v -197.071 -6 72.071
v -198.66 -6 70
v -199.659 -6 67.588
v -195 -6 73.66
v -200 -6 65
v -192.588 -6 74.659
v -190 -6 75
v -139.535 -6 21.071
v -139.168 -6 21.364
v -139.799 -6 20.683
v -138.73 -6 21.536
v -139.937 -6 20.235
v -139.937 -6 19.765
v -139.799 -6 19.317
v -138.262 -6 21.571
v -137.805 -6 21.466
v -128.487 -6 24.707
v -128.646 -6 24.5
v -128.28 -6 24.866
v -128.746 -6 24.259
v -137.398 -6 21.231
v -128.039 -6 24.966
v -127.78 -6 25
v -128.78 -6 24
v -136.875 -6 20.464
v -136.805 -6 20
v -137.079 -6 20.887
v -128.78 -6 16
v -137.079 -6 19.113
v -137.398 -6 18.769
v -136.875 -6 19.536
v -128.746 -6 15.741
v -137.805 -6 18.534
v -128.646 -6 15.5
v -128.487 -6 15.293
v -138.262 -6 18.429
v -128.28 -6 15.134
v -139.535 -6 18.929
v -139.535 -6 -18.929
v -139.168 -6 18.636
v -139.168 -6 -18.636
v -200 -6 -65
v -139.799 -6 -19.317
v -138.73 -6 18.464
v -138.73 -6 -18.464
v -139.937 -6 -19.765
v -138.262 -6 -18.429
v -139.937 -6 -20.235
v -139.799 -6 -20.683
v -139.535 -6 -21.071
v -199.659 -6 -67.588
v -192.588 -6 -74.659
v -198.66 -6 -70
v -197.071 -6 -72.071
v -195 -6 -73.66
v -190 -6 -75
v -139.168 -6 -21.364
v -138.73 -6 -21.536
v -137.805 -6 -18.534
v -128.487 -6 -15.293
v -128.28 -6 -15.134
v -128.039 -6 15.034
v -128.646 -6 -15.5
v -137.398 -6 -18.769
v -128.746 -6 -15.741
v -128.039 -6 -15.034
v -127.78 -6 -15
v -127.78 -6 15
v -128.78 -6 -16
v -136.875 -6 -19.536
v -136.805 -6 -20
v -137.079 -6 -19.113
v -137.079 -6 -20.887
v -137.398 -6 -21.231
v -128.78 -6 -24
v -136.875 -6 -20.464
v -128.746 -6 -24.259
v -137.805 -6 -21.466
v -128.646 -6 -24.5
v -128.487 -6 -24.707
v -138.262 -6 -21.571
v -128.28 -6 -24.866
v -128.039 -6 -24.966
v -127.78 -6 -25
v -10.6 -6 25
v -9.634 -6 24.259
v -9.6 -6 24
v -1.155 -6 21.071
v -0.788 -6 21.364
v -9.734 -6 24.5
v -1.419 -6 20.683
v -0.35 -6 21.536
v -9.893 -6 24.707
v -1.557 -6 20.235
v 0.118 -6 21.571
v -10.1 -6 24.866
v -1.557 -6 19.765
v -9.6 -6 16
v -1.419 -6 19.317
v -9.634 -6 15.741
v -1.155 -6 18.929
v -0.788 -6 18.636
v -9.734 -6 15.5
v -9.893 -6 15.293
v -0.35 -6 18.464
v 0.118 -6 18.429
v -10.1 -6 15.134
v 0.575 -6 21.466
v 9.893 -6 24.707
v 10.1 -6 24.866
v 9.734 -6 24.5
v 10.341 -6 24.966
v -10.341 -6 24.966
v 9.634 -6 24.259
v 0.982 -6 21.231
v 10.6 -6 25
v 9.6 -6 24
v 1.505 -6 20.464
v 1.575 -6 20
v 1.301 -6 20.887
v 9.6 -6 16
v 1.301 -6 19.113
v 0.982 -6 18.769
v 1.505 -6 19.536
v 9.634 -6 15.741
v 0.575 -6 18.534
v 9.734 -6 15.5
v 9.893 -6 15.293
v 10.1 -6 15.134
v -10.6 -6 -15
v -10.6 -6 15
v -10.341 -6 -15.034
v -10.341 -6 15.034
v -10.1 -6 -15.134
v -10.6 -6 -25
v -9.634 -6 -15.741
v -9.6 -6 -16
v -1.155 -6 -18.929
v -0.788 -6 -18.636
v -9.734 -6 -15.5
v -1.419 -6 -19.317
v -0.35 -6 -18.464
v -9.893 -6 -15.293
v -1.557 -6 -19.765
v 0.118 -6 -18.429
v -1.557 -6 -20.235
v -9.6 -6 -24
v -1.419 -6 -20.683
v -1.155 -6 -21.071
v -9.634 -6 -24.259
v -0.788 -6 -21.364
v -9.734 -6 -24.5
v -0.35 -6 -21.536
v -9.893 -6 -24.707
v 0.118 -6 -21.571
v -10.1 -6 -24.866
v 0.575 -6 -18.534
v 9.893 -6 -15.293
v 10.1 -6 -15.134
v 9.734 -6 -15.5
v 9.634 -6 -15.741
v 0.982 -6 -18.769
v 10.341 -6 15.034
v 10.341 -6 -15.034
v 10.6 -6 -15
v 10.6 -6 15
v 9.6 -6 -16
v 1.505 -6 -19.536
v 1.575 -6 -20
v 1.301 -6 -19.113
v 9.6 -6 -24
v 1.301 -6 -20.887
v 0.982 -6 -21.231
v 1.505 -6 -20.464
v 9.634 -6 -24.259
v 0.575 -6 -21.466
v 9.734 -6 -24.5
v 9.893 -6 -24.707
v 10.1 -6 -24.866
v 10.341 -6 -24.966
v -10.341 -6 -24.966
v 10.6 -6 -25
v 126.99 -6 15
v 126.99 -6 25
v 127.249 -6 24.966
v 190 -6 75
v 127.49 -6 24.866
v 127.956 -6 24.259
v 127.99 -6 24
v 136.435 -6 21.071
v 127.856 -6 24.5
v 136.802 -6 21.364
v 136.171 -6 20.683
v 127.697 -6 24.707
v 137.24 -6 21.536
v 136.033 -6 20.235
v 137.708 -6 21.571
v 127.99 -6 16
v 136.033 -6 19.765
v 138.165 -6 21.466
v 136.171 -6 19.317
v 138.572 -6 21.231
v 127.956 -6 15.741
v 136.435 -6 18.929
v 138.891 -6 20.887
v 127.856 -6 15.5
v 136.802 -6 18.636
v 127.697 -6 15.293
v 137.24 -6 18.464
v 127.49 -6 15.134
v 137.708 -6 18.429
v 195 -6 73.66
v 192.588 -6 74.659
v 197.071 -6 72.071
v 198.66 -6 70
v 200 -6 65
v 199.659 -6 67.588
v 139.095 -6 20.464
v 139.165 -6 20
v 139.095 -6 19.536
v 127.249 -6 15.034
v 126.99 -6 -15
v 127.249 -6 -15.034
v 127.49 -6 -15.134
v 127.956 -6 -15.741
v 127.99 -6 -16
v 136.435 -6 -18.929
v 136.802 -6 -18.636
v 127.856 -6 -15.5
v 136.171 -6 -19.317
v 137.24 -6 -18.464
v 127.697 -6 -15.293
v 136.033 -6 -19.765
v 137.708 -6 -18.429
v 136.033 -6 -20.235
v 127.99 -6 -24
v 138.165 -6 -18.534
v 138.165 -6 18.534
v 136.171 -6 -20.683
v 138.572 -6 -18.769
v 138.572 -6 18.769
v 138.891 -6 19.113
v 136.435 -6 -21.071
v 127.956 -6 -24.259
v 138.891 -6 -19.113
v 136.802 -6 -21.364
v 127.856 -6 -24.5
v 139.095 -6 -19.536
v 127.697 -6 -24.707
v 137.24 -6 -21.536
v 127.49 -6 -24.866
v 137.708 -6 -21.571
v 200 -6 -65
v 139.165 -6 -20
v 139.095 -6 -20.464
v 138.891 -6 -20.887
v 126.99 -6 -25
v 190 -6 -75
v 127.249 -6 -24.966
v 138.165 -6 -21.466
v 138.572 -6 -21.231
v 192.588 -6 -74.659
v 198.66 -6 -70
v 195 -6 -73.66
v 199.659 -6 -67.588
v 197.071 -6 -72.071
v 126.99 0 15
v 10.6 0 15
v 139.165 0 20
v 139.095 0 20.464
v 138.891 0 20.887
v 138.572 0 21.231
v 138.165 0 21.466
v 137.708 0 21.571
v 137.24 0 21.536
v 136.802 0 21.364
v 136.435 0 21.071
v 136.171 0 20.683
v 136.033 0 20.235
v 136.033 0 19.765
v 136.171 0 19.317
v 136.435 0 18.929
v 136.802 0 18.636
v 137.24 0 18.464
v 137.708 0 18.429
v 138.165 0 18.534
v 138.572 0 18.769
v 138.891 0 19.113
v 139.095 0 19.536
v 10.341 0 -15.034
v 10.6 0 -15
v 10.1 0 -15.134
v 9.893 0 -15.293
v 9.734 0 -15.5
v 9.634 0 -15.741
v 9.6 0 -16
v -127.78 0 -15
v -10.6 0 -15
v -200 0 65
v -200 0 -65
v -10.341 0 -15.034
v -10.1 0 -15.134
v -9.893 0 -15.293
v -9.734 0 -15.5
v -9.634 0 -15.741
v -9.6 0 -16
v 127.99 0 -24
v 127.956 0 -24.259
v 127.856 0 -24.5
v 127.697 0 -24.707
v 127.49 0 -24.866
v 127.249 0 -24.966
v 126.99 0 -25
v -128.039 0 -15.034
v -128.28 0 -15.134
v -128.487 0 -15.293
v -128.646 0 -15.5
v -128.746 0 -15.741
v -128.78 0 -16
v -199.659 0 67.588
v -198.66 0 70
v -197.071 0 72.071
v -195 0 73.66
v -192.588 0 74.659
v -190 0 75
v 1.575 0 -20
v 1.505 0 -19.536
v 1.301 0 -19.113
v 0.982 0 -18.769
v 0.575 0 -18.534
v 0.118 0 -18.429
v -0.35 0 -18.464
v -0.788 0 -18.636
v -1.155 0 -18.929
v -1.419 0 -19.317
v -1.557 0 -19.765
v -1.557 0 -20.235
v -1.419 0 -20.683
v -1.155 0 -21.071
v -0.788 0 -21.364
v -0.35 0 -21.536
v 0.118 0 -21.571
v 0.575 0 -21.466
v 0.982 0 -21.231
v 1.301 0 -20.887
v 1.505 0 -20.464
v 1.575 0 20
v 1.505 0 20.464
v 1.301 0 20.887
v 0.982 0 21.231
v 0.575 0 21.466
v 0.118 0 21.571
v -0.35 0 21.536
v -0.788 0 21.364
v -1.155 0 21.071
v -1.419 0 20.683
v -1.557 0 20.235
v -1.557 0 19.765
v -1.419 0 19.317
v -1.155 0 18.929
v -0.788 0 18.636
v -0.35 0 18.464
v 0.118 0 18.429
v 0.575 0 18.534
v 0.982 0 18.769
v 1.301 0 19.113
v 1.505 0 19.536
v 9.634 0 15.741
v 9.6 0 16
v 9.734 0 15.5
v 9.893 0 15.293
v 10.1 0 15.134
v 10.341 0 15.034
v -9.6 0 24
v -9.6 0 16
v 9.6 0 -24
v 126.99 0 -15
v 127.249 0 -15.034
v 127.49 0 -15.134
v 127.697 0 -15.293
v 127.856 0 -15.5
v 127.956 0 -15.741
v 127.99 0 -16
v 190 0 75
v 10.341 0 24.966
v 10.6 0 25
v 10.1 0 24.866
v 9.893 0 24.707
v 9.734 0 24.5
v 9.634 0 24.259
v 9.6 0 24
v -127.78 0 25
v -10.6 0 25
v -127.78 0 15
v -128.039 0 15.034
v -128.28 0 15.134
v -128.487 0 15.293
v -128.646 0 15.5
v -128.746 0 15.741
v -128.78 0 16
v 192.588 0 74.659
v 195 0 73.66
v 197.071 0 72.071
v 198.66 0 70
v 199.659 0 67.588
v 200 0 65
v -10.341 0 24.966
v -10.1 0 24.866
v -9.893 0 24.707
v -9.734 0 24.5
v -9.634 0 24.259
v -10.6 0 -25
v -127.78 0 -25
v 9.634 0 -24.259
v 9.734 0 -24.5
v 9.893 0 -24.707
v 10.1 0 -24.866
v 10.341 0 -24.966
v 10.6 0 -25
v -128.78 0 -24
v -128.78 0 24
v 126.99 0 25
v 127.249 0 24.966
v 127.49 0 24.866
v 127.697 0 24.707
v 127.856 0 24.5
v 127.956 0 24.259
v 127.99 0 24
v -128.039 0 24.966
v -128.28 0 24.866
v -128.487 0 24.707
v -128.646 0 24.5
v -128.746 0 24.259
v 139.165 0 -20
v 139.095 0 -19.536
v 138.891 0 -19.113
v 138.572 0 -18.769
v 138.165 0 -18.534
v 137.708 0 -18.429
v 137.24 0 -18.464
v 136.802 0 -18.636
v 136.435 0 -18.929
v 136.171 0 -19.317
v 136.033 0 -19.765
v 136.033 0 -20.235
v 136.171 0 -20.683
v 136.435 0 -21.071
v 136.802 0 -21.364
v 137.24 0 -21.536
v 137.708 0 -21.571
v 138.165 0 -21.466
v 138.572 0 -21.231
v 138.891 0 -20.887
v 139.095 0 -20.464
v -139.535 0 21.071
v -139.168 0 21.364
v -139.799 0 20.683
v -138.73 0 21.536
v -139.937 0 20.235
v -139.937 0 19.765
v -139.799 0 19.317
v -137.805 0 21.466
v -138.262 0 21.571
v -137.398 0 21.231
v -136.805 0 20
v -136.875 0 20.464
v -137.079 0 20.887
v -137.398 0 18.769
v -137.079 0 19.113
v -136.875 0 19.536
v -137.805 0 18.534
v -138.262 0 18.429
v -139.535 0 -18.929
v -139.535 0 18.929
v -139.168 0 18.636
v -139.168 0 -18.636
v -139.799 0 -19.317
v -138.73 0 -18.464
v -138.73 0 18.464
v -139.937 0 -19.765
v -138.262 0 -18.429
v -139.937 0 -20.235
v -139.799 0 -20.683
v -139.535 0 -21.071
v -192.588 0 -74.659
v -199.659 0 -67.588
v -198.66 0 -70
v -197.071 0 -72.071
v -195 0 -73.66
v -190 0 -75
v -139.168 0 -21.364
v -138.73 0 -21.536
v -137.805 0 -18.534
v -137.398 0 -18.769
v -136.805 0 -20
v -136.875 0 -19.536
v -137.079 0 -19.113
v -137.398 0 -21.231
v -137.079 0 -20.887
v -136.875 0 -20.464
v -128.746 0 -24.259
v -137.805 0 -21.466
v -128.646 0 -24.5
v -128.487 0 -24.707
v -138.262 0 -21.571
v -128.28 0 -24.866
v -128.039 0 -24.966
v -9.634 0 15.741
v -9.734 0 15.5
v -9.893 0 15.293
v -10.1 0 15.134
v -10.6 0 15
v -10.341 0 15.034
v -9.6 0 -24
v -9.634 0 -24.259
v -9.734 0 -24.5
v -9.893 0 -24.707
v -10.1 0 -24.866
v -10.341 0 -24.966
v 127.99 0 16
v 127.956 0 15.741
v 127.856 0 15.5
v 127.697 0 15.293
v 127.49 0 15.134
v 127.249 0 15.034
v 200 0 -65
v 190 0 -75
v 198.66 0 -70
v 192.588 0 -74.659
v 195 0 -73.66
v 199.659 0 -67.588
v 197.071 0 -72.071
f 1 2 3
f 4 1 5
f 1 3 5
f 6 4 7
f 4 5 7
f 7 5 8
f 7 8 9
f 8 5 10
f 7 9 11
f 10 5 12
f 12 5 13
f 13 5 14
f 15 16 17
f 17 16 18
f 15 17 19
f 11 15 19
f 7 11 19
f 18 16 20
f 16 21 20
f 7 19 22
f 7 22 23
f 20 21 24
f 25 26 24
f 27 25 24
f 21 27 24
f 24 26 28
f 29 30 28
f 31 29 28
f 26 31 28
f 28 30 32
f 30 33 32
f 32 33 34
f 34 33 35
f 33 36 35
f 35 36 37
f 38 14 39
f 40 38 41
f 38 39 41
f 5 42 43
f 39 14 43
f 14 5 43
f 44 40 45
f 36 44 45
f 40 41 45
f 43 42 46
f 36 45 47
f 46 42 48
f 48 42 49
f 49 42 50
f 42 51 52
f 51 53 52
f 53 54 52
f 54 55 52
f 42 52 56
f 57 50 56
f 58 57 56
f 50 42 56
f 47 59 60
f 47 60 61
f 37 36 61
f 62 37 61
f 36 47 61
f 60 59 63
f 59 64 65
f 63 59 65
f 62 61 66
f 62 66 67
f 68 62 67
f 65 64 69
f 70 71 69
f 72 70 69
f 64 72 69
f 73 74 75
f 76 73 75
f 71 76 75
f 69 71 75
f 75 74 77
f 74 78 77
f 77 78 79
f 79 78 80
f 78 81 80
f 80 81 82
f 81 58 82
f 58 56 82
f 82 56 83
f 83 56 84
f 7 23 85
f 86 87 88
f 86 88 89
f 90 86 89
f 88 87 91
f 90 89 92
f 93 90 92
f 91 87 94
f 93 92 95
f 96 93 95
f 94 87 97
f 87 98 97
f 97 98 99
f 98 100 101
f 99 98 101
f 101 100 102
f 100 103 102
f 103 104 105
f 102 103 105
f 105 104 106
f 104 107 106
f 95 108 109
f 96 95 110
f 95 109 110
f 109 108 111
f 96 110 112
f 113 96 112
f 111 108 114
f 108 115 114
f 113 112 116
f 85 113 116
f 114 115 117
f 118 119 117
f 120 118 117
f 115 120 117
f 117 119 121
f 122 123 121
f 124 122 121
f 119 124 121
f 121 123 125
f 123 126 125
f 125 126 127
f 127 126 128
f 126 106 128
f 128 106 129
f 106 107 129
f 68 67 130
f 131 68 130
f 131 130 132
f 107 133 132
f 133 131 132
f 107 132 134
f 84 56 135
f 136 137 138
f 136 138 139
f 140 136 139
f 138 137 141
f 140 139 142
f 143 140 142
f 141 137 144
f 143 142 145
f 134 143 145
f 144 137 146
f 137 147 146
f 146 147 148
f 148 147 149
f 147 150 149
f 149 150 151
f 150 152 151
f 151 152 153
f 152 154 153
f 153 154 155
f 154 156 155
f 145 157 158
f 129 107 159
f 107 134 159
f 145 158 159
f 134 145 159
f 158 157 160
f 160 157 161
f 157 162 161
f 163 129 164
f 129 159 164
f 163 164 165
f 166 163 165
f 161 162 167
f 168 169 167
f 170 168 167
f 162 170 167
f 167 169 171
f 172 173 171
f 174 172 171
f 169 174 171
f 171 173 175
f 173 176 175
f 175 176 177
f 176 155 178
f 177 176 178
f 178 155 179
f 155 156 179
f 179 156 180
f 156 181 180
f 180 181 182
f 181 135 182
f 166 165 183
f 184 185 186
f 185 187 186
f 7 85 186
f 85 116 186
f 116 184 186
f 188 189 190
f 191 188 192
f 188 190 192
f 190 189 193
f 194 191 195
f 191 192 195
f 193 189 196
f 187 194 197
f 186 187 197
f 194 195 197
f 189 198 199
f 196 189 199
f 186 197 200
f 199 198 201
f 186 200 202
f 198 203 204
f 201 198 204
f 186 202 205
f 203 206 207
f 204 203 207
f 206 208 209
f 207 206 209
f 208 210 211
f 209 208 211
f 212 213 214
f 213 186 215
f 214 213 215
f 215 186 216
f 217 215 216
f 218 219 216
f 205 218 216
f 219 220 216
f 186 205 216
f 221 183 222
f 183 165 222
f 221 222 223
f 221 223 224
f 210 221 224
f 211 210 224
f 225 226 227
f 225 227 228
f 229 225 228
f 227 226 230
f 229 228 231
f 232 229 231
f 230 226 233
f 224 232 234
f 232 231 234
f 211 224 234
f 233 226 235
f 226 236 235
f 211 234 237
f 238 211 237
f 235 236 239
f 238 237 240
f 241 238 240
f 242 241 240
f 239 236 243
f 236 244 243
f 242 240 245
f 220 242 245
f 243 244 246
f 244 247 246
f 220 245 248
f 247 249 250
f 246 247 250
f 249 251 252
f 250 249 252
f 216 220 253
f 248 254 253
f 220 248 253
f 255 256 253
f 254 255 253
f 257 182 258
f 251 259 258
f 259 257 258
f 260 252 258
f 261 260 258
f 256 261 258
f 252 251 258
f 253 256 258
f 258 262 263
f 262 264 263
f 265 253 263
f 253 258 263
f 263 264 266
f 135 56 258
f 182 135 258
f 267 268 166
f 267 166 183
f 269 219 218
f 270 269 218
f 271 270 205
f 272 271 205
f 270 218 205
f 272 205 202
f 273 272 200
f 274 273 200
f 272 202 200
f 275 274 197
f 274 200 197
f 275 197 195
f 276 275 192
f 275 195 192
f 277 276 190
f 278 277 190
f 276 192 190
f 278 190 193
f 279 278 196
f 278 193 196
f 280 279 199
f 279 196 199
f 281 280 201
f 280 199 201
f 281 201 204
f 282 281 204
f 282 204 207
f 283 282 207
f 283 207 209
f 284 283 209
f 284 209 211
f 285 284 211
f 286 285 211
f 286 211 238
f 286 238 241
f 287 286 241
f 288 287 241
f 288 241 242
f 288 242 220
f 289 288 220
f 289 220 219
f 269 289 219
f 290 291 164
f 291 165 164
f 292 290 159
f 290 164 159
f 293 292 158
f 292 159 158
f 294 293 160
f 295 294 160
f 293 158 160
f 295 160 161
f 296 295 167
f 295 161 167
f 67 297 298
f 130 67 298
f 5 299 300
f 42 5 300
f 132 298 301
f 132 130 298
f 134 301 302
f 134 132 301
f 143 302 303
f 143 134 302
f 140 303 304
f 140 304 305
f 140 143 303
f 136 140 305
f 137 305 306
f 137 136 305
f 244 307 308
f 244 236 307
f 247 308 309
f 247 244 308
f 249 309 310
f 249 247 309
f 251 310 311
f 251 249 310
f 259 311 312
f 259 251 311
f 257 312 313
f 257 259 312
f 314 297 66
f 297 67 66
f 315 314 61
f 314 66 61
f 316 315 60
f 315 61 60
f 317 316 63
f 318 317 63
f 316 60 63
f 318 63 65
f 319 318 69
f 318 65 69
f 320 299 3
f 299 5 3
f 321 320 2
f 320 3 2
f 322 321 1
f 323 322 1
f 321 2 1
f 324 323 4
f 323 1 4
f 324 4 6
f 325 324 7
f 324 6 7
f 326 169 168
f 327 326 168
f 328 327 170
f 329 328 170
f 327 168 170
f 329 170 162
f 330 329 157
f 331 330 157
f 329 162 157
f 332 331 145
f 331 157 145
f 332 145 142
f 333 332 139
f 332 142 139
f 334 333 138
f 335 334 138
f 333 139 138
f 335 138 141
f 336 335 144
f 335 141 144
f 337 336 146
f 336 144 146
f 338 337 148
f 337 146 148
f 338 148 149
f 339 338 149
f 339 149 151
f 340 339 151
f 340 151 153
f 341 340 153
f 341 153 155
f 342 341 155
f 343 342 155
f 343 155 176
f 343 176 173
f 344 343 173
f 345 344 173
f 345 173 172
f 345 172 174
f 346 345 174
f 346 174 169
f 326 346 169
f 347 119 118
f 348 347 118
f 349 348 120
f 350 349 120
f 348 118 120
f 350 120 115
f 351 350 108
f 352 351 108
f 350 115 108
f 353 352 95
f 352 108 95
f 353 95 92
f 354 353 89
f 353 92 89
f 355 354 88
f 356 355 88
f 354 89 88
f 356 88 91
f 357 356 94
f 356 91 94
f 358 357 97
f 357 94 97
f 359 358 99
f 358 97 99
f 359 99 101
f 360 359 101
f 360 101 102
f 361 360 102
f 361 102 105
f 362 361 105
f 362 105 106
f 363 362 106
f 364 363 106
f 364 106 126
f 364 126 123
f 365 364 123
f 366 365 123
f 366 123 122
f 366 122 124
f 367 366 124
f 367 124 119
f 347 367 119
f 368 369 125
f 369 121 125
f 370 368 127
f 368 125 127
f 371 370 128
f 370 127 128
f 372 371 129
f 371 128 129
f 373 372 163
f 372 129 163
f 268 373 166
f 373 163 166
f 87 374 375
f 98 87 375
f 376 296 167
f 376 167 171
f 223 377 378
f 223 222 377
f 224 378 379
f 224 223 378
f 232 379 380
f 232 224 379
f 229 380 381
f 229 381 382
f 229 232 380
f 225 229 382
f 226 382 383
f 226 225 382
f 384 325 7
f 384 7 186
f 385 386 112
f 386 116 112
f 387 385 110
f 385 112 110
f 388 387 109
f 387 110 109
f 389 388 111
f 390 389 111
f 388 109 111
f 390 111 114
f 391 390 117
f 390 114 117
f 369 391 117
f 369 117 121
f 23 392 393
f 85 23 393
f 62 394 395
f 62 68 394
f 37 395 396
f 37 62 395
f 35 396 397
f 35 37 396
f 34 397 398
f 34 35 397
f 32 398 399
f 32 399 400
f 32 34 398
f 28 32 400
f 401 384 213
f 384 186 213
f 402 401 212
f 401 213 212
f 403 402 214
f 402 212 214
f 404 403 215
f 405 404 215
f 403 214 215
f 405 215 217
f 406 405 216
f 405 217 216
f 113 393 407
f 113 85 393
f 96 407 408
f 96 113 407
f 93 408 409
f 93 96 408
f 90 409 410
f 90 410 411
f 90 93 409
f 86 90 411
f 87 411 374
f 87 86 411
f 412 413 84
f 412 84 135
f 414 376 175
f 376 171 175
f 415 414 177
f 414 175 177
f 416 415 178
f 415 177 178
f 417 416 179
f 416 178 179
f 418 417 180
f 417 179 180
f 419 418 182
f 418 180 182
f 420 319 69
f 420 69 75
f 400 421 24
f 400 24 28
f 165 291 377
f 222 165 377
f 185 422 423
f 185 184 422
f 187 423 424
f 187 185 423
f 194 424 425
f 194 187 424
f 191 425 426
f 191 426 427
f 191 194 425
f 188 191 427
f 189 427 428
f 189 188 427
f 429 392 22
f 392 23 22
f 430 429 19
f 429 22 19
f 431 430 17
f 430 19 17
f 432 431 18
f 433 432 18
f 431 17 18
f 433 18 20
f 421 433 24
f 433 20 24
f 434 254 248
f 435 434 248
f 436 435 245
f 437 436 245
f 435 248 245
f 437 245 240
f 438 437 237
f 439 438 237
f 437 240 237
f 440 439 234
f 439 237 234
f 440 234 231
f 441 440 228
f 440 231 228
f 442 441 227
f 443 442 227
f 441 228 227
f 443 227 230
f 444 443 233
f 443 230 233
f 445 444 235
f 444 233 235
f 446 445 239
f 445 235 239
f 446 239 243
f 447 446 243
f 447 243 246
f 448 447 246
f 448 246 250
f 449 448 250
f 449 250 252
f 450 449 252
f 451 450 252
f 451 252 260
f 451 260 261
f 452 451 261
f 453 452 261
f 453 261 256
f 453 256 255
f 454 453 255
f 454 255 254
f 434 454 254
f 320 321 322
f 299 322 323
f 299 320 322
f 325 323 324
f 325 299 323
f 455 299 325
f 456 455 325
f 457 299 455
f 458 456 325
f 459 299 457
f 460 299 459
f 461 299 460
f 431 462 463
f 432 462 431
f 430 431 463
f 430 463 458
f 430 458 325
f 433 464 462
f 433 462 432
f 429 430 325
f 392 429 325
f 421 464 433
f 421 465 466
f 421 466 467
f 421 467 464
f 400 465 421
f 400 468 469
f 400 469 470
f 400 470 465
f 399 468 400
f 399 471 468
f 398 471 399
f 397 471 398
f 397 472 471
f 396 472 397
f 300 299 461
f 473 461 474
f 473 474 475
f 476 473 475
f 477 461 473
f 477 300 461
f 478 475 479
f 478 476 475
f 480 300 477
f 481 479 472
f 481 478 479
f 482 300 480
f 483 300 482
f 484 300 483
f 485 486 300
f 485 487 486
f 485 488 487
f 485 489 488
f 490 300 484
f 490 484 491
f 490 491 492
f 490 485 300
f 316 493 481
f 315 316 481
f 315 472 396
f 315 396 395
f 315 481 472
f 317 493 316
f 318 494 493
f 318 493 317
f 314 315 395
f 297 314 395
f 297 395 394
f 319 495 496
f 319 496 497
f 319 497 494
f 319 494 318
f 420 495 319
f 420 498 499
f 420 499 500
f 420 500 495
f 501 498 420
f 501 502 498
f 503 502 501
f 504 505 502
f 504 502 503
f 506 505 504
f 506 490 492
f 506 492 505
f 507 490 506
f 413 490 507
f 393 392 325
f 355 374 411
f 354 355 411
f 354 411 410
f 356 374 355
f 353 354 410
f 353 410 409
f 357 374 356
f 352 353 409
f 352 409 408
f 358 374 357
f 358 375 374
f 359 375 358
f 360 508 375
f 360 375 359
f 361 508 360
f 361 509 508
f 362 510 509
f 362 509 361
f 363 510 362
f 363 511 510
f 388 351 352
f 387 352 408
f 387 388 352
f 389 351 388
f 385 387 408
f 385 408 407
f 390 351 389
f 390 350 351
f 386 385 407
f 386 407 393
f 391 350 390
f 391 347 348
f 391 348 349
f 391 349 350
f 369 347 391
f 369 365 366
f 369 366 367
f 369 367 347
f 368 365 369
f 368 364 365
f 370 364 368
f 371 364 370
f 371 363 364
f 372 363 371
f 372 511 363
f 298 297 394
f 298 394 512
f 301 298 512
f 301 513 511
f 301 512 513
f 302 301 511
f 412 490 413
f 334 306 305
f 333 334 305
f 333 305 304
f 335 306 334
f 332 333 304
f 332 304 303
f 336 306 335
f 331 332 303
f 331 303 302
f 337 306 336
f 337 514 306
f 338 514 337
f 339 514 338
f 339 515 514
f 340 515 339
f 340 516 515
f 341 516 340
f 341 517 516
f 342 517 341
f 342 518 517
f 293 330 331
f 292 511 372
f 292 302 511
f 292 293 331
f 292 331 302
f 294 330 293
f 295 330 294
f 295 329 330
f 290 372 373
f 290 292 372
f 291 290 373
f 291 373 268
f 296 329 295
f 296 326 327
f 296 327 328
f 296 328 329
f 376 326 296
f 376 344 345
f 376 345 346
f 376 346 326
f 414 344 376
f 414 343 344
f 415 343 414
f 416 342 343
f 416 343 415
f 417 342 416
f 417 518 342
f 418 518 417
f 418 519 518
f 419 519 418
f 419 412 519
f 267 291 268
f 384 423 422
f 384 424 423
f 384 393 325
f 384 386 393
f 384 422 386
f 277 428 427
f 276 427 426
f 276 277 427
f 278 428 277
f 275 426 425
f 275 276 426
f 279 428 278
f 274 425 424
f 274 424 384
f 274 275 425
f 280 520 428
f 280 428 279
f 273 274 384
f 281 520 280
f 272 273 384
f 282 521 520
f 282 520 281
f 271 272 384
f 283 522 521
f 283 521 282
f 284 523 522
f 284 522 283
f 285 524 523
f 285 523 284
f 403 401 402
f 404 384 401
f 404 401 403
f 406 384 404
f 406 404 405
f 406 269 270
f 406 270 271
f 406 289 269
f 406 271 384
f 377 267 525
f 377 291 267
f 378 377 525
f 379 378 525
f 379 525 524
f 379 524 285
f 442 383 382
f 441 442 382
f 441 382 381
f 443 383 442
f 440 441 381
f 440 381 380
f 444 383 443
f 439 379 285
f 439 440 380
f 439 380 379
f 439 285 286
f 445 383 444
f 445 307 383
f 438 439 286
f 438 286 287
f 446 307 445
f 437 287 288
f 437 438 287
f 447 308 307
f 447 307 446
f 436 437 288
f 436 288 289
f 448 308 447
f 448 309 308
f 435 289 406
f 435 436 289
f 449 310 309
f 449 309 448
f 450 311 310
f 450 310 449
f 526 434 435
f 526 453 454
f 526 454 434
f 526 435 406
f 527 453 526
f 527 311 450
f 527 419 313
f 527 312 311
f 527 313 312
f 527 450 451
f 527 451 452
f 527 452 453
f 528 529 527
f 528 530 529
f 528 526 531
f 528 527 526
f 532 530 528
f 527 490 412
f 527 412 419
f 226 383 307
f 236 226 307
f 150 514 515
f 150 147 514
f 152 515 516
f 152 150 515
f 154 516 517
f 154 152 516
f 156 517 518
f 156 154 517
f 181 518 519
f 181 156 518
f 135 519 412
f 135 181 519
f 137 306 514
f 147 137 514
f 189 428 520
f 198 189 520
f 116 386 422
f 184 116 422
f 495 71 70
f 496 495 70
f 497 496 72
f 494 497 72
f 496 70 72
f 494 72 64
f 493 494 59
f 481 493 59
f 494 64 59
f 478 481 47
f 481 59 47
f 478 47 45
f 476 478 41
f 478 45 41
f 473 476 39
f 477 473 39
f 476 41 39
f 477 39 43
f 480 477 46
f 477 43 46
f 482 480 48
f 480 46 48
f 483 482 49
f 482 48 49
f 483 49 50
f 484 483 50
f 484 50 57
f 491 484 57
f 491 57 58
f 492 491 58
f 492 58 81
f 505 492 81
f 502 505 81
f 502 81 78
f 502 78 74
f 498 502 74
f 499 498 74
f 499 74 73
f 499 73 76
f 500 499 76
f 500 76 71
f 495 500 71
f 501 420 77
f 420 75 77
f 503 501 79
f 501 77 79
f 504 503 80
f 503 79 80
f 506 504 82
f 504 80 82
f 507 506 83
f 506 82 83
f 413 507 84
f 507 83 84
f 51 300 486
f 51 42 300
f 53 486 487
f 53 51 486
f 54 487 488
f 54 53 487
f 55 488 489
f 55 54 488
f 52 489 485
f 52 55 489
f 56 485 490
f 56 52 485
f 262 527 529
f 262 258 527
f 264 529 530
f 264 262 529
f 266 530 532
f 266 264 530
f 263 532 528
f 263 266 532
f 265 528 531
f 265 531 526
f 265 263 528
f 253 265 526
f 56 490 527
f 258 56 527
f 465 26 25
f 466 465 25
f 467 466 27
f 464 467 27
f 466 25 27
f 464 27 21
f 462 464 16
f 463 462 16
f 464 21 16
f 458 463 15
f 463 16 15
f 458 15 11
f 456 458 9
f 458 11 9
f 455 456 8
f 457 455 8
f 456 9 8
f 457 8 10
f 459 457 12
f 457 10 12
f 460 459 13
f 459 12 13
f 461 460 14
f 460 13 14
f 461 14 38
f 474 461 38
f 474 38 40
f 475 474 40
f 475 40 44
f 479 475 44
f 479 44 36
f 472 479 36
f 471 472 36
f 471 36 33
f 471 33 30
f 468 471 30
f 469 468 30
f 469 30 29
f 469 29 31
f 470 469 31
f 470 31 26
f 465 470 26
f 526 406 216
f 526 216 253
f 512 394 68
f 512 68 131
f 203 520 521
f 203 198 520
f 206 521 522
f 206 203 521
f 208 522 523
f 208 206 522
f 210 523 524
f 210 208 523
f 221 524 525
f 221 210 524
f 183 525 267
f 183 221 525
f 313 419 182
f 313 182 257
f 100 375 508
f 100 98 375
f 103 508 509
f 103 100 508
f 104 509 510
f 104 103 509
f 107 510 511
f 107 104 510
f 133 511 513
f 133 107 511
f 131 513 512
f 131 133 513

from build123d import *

# Parameters (mm, degrees)
IZIM1_W                     = 400
IZIM1_H                     = 150
IZIM1_W_2                   = 119.18
IZIM1_H_2                   = 10
IZIM1_W_3                   = 118.39
Y_KSEKLIK_EKSTR_ZYON1_DEPTH = 6
RADYUS1_R                   = 10
RADYUS2_R                   = 1
IZIM2_R                     = 1.575
KES_EKSTR_ZYON1_DEPTH       = 7


with BuildPart() as part:
    # Çizim1 → Yükseklik-Ekstrüzyon1 (new body)
    with BuildSketch(Plane(origin=(0, 0, 0), x_dir=(1, 0, 0), z_dir=(0, 1, 0))):
        Rectangle(IZIM1_W, IZIM1_H)
        with Locations((-69.19, 20)):
            Rectangle(IZIM1_W_2, IZIM1_H_2, mode=Mode.SUBTRACT)
        with Locations((68.795, 20)):
            Rectangle(IZIM1_W_3, IZIM1_H_2, mode=Mode.SUBTRACT)
        with Locations((68.795, -20)):
            Rectangle(IZIM1_W_3, IZIM1_H_2, mode=Mode.SUBTRACT)
        with Locations((-69.19, -20)):
            Rectangle(IZIM1_W_2, IZIM1_H_2, mode=Mode.SUBTRACT)
    extrude(amount=-Y_KSEKLIK_EKSTR_ZYON1_DEPTH)

    # Radyus1
    radyus1_edges = [part.edges().sort_by_distance(p)[0] for p in [
        (200, -3, 75),
        (-200, -3, 75),
        (-200, -3, -75),
        (200, -3, -75),
    ]]
    fillet(radyus1_edges, radius=RADYUS1_R)

    # Radyus2
    radyus2_edges = [part.edges().sort_by_distance(p)[0] for p in [
        (9.6, -3, -15),
        (9.6, -3, -25),
        (127.99, -3, -25),
        (127.99, -3, -15),
        (-9.6, -3, -25),
        (-9.6, -3, -15),
        (-128.78, -3, -15),
        (-128.78, -3, -25),
        (127.99, -3, 15),
        (127.99, -3, 25),
        (9.6, -3, 25),
        (9.6, -3, 15),
        (-9.6, -3, 15),
        (-9.6, -3, 25),
        (-128.78, -3, 25),
        (-128.78, -3, 15),
    ]]
    fillet(radyus2_edges, radius=RADYUS2_R)

    # Çizim2 → Kes-Ekstrüzyon1 (cut, through all)
    with BuildSketch(Plane.XZ.offset(6)):
        with Locations((-138.38, 20)):
            Circle(IZIM2_R)
        with Locations((-138.38, -20)):
            Circle(IZIM2_R)
        with Locations((0, -20)):
            Circle(IZIM2_R)
        with Locations((0, 20)):
            Circle(IZIM2_R)
        with Locations((137.59, 20)):
            Circle(IZIM2_R)
        with Locations((137.59, -20)):
            Circle(IZIM2_R)
    extrude(amount=-KES_EKSTR_ZYON1_DEPTH, mode=Mode.SUBTRACT)


solid = part.part
